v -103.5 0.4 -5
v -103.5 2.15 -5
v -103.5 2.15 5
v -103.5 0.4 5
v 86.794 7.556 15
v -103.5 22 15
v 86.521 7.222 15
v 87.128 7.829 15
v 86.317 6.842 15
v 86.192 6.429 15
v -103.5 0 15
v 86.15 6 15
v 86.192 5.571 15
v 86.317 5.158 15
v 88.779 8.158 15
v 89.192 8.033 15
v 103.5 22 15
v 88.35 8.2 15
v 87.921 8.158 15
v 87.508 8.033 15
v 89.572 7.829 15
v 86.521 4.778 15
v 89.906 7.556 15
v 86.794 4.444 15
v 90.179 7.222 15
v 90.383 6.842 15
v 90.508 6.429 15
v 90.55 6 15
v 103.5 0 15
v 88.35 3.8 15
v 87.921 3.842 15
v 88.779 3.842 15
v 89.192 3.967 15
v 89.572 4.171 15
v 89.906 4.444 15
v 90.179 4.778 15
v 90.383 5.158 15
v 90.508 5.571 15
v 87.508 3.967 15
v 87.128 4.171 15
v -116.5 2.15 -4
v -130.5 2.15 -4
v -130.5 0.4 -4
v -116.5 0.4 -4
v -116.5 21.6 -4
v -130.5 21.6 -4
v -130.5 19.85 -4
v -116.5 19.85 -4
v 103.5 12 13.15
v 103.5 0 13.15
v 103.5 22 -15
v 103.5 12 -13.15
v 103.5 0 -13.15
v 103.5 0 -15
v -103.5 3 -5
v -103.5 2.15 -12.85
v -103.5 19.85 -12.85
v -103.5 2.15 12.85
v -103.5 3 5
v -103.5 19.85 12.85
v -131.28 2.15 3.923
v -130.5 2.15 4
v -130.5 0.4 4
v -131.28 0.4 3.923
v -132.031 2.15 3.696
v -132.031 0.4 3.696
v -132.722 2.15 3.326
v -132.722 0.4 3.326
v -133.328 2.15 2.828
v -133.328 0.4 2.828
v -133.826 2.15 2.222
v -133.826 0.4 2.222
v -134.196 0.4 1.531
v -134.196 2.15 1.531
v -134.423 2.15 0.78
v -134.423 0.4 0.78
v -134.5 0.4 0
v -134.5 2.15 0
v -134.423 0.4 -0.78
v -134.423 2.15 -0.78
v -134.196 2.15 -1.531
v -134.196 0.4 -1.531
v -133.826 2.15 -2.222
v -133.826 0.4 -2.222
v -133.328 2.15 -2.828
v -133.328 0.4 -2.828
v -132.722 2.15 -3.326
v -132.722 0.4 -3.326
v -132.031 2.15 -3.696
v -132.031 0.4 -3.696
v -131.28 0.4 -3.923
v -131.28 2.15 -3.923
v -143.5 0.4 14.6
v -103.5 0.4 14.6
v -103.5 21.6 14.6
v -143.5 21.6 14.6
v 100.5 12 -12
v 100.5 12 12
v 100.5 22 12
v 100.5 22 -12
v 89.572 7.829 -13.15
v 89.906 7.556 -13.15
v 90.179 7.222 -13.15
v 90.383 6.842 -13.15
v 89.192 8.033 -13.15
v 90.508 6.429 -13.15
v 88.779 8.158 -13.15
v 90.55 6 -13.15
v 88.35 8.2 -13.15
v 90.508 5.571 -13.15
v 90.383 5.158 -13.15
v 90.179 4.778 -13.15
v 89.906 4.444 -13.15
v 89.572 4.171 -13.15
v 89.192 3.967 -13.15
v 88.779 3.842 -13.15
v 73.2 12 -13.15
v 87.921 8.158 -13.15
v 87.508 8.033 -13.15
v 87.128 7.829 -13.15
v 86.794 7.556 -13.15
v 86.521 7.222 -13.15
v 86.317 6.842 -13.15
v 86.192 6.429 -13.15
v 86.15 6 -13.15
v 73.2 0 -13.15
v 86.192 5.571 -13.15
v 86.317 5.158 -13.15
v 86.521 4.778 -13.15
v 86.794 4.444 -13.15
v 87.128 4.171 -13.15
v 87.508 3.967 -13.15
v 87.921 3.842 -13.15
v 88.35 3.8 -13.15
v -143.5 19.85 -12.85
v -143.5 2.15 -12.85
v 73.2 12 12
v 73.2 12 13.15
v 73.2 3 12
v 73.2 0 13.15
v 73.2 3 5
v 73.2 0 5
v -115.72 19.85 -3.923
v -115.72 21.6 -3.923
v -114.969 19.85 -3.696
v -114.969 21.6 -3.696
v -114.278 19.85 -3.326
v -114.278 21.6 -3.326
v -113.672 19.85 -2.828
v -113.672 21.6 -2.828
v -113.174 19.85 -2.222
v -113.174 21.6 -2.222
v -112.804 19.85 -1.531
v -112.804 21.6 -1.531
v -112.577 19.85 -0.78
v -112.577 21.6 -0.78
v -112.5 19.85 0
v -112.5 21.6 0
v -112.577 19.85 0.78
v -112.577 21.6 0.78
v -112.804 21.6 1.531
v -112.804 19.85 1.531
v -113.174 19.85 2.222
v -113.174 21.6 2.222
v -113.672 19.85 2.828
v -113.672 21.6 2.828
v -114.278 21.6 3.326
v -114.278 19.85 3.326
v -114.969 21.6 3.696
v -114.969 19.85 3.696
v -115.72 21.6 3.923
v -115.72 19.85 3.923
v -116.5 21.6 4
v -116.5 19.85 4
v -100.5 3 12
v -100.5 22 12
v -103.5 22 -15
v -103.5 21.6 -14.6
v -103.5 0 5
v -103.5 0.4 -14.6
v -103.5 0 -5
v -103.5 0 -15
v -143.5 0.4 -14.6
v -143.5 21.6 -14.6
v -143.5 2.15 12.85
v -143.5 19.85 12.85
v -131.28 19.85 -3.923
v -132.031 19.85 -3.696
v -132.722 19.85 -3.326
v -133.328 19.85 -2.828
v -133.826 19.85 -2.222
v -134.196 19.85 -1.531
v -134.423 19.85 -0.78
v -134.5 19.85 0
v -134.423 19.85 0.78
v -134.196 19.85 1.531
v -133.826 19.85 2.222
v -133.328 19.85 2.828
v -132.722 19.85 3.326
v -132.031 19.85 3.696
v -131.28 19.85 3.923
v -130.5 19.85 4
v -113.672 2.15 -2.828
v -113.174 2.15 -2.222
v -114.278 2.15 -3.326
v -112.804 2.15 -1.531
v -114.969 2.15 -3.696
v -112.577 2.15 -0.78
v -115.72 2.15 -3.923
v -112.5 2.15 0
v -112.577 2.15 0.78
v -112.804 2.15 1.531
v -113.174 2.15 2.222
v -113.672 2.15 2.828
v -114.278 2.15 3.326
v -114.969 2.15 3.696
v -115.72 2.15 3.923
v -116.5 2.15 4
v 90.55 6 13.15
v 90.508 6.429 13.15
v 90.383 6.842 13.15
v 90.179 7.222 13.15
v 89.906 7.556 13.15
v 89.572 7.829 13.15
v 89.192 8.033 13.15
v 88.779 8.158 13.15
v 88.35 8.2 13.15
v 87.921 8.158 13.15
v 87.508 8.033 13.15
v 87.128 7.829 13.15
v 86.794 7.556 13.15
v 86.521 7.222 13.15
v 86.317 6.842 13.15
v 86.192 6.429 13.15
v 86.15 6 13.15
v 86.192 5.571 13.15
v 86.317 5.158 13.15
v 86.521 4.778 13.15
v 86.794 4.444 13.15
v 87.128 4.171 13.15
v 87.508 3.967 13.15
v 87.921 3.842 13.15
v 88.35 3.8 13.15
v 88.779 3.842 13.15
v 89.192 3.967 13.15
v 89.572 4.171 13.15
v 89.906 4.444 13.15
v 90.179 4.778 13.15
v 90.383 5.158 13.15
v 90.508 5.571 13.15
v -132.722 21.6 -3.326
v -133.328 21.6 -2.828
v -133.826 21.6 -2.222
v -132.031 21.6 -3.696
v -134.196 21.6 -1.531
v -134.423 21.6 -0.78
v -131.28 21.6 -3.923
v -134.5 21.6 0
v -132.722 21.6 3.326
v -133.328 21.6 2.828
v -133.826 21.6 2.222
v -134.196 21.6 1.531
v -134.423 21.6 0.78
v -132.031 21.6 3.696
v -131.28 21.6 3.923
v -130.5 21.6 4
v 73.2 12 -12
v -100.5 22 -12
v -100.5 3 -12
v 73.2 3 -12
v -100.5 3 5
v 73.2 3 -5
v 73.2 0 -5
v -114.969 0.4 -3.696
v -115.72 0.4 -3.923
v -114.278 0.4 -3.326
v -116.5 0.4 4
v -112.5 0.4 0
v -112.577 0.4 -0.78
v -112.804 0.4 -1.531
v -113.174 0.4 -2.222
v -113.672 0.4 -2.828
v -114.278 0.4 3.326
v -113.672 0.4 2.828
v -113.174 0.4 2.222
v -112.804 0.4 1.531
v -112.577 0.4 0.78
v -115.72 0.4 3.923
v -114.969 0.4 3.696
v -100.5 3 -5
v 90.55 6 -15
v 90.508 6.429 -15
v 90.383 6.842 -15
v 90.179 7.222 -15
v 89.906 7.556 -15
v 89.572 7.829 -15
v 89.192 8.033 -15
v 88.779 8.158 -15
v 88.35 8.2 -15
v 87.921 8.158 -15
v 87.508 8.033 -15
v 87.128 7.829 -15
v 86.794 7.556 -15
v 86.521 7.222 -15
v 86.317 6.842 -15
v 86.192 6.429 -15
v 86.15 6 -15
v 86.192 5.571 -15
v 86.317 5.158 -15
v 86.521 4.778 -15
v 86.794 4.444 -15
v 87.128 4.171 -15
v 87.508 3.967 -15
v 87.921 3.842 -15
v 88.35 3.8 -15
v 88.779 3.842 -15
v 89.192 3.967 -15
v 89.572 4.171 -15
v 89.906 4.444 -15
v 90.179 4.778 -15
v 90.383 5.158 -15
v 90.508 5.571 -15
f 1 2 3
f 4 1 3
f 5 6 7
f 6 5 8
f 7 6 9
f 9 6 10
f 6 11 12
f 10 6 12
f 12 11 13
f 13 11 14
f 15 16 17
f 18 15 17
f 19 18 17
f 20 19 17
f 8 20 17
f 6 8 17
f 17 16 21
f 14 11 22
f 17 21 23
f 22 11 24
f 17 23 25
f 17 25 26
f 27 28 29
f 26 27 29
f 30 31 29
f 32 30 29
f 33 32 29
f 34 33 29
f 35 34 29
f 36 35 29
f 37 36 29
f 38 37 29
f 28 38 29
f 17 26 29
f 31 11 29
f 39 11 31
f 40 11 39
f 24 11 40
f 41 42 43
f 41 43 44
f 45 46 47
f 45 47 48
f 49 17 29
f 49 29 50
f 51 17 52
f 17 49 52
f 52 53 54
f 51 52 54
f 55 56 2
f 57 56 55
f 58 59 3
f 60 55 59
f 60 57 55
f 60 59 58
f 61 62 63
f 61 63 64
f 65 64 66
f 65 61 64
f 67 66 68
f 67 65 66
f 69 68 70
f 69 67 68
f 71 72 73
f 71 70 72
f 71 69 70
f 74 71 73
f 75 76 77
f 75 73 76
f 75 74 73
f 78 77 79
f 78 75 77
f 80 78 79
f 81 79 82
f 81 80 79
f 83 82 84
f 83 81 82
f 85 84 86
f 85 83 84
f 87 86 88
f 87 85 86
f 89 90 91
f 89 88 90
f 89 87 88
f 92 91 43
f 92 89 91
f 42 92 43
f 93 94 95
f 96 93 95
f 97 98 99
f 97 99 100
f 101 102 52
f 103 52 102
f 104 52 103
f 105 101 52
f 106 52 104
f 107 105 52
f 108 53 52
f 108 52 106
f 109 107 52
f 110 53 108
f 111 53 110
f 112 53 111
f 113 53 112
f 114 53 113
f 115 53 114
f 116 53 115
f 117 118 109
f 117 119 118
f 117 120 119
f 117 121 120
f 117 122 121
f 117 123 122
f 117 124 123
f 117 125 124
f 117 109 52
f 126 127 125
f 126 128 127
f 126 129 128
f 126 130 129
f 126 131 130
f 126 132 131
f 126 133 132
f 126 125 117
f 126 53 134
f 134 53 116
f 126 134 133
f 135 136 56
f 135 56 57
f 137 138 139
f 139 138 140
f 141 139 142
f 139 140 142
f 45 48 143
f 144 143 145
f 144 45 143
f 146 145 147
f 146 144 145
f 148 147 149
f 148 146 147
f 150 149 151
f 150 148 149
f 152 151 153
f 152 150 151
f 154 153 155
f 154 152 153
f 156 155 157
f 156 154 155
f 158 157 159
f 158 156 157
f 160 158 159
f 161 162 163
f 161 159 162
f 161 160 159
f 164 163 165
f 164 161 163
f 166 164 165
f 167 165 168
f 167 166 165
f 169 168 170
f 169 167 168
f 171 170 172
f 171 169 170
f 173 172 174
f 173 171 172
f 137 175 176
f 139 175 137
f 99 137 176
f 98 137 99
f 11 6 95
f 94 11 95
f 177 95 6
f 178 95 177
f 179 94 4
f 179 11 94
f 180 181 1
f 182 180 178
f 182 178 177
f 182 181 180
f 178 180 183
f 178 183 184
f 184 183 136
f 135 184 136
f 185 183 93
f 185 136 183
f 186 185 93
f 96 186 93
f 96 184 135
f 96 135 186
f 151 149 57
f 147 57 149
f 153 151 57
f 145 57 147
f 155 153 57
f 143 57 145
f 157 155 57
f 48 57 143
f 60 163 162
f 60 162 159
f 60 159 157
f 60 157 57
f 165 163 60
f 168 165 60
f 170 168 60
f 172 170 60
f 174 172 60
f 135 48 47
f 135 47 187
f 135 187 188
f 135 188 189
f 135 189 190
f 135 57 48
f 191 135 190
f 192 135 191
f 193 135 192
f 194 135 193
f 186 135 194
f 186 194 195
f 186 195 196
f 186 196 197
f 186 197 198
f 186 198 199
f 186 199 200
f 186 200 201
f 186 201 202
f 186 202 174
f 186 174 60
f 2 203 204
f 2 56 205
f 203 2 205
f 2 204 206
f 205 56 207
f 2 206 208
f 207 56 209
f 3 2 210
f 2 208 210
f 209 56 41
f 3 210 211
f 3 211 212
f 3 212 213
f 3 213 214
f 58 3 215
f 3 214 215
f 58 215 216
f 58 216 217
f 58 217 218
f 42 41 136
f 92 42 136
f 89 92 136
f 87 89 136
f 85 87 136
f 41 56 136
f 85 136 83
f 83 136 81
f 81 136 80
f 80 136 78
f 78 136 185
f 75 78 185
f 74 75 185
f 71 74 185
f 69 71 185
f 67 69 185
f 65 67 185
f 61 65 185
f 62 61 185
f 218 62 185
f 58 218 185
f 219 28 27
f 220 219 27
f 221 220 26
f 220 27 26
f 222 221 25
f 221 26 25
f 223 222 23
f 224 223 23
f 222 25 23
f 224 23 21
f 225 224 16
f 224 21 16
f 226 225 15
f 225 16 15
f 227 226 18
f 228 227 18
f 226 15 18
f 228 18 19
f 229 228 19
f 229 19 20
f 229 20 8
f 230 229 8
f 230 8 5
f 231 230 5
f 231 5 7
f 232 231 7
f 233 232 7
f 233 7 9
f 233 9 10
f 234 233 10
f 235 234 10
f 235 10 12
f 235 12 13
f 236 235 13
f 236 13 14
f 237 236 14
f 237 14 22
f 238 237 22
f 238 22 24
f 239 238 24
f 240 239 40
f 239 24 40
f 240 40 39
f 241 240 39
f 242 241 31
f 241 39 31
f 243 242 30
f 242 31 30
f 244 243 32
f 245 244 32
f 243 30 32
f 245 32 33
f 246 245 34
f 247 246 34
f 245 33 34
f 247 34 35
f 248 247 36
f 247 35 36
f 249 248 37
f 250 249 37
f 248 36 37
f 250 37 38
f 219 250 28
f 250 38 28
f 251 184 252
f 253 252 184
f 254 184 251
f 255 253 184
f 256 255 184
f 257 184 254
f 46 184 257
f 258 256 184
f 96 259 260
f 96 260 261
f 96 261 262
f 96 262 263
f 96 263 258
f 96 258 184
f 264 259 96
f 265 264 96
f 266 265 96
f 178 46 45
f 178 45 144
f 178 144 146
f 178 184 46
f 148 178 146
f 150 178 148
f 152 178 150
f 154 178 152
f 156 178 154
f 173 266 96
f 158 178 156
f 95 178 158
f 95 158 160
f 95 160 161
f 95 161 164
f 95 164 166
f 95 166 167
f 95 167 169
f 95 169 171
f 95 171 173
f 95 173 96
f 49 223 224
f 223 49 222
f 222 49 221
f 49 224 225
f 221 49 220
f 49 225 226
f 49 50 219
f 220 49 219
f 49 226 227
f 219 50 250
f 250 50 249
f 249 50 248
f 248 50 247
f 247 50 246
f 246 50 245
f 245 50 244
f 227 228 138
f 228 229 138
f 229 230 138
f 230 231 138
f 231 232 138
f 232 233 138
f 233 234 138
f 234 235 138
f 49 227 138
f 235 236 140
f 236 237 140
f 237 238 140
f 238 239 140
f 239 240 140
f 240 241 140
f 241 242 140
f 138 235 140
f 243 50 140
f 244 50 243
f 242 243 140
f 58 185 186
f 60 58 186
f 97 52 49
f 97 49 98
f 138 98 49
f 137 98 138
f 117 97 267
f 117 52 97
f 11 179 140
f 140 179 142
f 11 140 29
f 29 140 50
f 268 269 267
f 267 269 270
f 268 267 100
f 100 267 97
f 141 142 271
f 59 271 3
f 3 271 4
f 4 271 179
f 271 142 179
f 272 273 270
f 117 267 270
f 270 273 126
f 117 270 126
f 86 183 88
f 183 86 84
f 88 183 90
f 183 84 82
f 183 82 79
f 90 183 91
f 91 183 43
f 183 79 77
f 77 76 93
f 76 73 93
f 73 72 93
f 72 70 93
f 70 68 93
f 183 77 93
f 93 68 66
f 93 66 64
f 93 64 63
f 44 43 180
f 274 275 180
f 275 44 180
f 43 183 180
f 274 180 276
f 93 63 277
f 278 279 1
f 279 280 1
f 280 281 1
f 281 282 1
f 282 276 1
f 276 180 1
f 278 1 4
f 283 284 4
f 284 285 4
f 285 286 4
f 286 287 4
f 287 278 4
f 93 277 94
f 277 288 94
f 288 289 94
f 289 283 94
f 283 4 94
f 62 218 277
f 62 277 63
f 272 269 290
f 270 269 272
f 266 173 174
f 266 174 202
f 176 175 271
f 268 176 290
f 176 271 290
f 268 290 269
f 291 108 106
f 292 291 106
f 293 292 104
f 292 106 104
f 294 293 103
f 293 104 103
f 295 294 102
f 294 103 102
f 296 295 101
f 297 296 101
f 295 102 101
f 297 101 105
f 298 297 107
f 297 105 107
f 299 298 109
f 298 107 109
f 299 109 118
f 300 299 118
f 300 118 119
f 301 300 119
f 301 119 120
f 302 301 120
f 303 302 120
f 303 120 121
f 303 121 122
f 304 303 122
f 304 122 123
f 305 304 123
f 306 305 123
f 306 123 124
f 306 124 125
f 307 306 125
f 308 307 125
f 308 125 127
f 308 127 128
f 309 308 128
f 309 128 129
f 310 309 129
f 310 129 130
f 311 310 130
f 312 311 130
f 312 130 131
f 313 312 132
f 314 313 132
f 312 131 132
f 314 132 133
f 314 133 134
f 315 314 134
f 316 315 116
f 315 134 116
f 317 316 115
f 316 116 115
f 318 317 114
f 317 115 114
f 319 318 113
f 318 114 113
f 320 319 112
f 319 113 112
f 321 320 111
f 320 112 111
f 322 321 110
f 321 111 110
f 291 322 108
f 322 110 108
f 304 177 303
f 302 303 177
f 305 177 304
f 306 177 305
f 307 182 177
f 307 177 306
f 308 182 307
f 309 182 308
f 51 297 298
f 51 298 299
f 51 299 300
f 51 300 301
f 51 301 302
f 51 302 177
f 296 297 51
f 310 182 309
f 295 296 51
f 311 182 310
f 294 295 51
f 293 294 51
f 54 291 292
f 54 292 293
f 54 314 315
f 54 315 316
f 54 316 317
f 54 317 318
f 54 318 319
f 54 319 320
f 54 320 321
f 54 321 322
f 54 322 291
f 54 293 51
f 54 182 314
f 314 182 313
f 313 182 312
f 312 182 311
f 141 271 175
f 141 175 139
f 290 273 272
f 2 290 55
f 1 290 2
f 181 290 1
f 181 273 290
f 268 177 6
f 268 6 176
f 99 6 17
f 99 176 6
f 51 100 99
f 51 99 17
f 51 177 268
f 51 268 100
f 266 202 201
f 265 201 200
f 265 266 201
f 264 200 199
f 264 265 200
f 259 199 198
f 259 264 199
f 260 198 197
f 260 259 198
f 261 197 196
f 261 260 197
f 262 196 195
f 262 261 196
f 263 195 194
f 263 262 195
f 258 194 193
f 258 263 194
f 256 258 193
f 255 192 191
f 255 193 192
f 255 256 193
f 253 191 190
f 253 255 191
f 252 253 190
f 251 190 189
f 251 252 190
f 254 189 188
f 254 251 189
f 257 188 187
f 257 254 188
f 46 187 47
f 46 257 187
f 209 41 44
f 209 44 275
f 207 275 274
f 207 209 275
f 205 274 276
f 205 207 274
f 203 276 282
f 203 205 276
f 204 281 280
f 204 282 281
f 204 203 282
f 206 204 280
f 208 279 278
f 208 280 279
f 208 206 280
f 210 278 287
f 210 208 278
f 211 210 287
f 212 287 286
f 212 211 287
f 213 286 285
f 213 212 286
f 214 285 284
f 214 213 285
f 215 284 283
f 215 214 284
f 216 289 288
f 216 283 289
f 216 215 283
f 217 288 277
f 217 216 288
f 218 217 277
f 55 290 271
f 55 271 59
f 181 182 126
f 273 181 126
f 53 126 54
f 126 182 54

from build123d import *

# Parameters (mm, degrees)
SKETCH1_W           = 207
SKETCH1_H           = 30
BOSS_EXTRUDE1_DEPTH = 22
SHELL1_T            = -3
SKETCH2_W           = 207
SKETCH2_H           = 10
CUT_EXTRUDE1_DEPTH  = 3
SKETCH3_W           = 29.2
SKETCH3_H           = 21.2
BOSS_EXTRUDE2_DEPTH = 40
SKETCH4_W           = 25.7
SKETCH4_H           = 17.7
CUT_EXTRUDE2_DEPTH  = 40
CUT_EXTRUDE3_DEPTH  = 146.889718623
SKETCH6_W           = 30.3
SKETCH6_H           = 26.3
CUT_EXTRUDE4_DEPTH  = 12
SKETCH7_R           = 2.2
CUT_EXTRUDE5_DEPTH  = 149.243886889


with BuildPart() as part:
    # Sketch1 → Boss-Extrude1 (new body)
    with BuildSketch(Plane(origin=(0, 0, 0), x_dir=(1, 0, 0), z_dir=(0, 1, 0))):
        Rectangle(SKETCH1_W, SKETCH1_H)
    extrude(amount=BOSS_EXTRUDE1_DEPTH)

    # Shell1
    shell1_openings = [part.faces().sort_by_distance(p)[0] for p in [
        (0, 22, 0),
    ]]
    offset(amount=SHELL1_T, openings=shell1_openings, kind=Kind.INTERSECTION)

    # Sketch2 → Cut-Extrude1 (cut)
    with BuildSketch(Plane(origin=(0, 0, 0), x_dir=(-1, 0, 0), z_dir=(0, -1, 0))):
        Rectangle(SKETCH2_W, SKETCH2_H)
    extrude(amount=-CUT_EXTRUDE1_DEPTH, mode=Mode.SUBTRACT)

    # Sketch3 → Boss-Extrude2 (add)
    with BuildSketch(Plane.ZY.offset(103.5)):
        with Locations((0, 11)):
            Rectangle(SKETCH3_W, SKETCH3_H)
    extrude(amount=BOSS_EXTRUDE2_DEPTH)

    # Sketch4 → Cut-Extrude2 (cut)
    with BuildSketch(Plane.ZY.offset(143.5)):
        with Locations((0, 11)):
            Rectangle(SKETCH4_W, SKETCH4_H)
    extrude(amount=-CUT_EXTRUDE2_DEPTH, mode=Mode.SUBTRACT)

    # Sketch5 → Cut-Extrude3 (cut, through all)
    with BuildSketch(Plane(origin=(0, 21.6, 0), x_dir=(1, 0, 0), z_dir=(0, 1, 0))):
        with BuildLine():
            Line((-130.5, 4), (-116.5, 4))
            ThreePointArc((-116.5, 4), (-112.5, 0), (-116.5, -4))
            Line((-116.5, -4), (-130.5, -4))
            ThreePointArc((-130.5, -4), (-134.5, 0), (-130.5, 4))
        make_face()
    extrude(amount=-CUT_EXTRUDE3_DEPTH, mode=Mode.SUBTRACT)

    # Sketch6 → Cut-Extrude4 (cut)
    with BuildSketch(Plane(origin=(0, 0, 0), x_dir=(-1, 0, 0), z_dir=(0, -1, 0))):
        with Locations((-88.35, 0)):
            Rectangle(SKETCH6_W, SKETCH6_H)
    extrude(amount=-CUT_EXTRUDE4_DEPTH, mode=Mode.SUBTRACT)

    # Sketch7 → Cut-Extrude5 (cut, through all)
    with BuildSketch(Plane.XY.offset(15)):
        with Locations((88.35, 6)):
            Circle(SKETCH7_R)
    extrude(amount=-CUT_EXTRUDE5_DEPTH, mode=Mode.SUBTRACT)


solid = part.part
